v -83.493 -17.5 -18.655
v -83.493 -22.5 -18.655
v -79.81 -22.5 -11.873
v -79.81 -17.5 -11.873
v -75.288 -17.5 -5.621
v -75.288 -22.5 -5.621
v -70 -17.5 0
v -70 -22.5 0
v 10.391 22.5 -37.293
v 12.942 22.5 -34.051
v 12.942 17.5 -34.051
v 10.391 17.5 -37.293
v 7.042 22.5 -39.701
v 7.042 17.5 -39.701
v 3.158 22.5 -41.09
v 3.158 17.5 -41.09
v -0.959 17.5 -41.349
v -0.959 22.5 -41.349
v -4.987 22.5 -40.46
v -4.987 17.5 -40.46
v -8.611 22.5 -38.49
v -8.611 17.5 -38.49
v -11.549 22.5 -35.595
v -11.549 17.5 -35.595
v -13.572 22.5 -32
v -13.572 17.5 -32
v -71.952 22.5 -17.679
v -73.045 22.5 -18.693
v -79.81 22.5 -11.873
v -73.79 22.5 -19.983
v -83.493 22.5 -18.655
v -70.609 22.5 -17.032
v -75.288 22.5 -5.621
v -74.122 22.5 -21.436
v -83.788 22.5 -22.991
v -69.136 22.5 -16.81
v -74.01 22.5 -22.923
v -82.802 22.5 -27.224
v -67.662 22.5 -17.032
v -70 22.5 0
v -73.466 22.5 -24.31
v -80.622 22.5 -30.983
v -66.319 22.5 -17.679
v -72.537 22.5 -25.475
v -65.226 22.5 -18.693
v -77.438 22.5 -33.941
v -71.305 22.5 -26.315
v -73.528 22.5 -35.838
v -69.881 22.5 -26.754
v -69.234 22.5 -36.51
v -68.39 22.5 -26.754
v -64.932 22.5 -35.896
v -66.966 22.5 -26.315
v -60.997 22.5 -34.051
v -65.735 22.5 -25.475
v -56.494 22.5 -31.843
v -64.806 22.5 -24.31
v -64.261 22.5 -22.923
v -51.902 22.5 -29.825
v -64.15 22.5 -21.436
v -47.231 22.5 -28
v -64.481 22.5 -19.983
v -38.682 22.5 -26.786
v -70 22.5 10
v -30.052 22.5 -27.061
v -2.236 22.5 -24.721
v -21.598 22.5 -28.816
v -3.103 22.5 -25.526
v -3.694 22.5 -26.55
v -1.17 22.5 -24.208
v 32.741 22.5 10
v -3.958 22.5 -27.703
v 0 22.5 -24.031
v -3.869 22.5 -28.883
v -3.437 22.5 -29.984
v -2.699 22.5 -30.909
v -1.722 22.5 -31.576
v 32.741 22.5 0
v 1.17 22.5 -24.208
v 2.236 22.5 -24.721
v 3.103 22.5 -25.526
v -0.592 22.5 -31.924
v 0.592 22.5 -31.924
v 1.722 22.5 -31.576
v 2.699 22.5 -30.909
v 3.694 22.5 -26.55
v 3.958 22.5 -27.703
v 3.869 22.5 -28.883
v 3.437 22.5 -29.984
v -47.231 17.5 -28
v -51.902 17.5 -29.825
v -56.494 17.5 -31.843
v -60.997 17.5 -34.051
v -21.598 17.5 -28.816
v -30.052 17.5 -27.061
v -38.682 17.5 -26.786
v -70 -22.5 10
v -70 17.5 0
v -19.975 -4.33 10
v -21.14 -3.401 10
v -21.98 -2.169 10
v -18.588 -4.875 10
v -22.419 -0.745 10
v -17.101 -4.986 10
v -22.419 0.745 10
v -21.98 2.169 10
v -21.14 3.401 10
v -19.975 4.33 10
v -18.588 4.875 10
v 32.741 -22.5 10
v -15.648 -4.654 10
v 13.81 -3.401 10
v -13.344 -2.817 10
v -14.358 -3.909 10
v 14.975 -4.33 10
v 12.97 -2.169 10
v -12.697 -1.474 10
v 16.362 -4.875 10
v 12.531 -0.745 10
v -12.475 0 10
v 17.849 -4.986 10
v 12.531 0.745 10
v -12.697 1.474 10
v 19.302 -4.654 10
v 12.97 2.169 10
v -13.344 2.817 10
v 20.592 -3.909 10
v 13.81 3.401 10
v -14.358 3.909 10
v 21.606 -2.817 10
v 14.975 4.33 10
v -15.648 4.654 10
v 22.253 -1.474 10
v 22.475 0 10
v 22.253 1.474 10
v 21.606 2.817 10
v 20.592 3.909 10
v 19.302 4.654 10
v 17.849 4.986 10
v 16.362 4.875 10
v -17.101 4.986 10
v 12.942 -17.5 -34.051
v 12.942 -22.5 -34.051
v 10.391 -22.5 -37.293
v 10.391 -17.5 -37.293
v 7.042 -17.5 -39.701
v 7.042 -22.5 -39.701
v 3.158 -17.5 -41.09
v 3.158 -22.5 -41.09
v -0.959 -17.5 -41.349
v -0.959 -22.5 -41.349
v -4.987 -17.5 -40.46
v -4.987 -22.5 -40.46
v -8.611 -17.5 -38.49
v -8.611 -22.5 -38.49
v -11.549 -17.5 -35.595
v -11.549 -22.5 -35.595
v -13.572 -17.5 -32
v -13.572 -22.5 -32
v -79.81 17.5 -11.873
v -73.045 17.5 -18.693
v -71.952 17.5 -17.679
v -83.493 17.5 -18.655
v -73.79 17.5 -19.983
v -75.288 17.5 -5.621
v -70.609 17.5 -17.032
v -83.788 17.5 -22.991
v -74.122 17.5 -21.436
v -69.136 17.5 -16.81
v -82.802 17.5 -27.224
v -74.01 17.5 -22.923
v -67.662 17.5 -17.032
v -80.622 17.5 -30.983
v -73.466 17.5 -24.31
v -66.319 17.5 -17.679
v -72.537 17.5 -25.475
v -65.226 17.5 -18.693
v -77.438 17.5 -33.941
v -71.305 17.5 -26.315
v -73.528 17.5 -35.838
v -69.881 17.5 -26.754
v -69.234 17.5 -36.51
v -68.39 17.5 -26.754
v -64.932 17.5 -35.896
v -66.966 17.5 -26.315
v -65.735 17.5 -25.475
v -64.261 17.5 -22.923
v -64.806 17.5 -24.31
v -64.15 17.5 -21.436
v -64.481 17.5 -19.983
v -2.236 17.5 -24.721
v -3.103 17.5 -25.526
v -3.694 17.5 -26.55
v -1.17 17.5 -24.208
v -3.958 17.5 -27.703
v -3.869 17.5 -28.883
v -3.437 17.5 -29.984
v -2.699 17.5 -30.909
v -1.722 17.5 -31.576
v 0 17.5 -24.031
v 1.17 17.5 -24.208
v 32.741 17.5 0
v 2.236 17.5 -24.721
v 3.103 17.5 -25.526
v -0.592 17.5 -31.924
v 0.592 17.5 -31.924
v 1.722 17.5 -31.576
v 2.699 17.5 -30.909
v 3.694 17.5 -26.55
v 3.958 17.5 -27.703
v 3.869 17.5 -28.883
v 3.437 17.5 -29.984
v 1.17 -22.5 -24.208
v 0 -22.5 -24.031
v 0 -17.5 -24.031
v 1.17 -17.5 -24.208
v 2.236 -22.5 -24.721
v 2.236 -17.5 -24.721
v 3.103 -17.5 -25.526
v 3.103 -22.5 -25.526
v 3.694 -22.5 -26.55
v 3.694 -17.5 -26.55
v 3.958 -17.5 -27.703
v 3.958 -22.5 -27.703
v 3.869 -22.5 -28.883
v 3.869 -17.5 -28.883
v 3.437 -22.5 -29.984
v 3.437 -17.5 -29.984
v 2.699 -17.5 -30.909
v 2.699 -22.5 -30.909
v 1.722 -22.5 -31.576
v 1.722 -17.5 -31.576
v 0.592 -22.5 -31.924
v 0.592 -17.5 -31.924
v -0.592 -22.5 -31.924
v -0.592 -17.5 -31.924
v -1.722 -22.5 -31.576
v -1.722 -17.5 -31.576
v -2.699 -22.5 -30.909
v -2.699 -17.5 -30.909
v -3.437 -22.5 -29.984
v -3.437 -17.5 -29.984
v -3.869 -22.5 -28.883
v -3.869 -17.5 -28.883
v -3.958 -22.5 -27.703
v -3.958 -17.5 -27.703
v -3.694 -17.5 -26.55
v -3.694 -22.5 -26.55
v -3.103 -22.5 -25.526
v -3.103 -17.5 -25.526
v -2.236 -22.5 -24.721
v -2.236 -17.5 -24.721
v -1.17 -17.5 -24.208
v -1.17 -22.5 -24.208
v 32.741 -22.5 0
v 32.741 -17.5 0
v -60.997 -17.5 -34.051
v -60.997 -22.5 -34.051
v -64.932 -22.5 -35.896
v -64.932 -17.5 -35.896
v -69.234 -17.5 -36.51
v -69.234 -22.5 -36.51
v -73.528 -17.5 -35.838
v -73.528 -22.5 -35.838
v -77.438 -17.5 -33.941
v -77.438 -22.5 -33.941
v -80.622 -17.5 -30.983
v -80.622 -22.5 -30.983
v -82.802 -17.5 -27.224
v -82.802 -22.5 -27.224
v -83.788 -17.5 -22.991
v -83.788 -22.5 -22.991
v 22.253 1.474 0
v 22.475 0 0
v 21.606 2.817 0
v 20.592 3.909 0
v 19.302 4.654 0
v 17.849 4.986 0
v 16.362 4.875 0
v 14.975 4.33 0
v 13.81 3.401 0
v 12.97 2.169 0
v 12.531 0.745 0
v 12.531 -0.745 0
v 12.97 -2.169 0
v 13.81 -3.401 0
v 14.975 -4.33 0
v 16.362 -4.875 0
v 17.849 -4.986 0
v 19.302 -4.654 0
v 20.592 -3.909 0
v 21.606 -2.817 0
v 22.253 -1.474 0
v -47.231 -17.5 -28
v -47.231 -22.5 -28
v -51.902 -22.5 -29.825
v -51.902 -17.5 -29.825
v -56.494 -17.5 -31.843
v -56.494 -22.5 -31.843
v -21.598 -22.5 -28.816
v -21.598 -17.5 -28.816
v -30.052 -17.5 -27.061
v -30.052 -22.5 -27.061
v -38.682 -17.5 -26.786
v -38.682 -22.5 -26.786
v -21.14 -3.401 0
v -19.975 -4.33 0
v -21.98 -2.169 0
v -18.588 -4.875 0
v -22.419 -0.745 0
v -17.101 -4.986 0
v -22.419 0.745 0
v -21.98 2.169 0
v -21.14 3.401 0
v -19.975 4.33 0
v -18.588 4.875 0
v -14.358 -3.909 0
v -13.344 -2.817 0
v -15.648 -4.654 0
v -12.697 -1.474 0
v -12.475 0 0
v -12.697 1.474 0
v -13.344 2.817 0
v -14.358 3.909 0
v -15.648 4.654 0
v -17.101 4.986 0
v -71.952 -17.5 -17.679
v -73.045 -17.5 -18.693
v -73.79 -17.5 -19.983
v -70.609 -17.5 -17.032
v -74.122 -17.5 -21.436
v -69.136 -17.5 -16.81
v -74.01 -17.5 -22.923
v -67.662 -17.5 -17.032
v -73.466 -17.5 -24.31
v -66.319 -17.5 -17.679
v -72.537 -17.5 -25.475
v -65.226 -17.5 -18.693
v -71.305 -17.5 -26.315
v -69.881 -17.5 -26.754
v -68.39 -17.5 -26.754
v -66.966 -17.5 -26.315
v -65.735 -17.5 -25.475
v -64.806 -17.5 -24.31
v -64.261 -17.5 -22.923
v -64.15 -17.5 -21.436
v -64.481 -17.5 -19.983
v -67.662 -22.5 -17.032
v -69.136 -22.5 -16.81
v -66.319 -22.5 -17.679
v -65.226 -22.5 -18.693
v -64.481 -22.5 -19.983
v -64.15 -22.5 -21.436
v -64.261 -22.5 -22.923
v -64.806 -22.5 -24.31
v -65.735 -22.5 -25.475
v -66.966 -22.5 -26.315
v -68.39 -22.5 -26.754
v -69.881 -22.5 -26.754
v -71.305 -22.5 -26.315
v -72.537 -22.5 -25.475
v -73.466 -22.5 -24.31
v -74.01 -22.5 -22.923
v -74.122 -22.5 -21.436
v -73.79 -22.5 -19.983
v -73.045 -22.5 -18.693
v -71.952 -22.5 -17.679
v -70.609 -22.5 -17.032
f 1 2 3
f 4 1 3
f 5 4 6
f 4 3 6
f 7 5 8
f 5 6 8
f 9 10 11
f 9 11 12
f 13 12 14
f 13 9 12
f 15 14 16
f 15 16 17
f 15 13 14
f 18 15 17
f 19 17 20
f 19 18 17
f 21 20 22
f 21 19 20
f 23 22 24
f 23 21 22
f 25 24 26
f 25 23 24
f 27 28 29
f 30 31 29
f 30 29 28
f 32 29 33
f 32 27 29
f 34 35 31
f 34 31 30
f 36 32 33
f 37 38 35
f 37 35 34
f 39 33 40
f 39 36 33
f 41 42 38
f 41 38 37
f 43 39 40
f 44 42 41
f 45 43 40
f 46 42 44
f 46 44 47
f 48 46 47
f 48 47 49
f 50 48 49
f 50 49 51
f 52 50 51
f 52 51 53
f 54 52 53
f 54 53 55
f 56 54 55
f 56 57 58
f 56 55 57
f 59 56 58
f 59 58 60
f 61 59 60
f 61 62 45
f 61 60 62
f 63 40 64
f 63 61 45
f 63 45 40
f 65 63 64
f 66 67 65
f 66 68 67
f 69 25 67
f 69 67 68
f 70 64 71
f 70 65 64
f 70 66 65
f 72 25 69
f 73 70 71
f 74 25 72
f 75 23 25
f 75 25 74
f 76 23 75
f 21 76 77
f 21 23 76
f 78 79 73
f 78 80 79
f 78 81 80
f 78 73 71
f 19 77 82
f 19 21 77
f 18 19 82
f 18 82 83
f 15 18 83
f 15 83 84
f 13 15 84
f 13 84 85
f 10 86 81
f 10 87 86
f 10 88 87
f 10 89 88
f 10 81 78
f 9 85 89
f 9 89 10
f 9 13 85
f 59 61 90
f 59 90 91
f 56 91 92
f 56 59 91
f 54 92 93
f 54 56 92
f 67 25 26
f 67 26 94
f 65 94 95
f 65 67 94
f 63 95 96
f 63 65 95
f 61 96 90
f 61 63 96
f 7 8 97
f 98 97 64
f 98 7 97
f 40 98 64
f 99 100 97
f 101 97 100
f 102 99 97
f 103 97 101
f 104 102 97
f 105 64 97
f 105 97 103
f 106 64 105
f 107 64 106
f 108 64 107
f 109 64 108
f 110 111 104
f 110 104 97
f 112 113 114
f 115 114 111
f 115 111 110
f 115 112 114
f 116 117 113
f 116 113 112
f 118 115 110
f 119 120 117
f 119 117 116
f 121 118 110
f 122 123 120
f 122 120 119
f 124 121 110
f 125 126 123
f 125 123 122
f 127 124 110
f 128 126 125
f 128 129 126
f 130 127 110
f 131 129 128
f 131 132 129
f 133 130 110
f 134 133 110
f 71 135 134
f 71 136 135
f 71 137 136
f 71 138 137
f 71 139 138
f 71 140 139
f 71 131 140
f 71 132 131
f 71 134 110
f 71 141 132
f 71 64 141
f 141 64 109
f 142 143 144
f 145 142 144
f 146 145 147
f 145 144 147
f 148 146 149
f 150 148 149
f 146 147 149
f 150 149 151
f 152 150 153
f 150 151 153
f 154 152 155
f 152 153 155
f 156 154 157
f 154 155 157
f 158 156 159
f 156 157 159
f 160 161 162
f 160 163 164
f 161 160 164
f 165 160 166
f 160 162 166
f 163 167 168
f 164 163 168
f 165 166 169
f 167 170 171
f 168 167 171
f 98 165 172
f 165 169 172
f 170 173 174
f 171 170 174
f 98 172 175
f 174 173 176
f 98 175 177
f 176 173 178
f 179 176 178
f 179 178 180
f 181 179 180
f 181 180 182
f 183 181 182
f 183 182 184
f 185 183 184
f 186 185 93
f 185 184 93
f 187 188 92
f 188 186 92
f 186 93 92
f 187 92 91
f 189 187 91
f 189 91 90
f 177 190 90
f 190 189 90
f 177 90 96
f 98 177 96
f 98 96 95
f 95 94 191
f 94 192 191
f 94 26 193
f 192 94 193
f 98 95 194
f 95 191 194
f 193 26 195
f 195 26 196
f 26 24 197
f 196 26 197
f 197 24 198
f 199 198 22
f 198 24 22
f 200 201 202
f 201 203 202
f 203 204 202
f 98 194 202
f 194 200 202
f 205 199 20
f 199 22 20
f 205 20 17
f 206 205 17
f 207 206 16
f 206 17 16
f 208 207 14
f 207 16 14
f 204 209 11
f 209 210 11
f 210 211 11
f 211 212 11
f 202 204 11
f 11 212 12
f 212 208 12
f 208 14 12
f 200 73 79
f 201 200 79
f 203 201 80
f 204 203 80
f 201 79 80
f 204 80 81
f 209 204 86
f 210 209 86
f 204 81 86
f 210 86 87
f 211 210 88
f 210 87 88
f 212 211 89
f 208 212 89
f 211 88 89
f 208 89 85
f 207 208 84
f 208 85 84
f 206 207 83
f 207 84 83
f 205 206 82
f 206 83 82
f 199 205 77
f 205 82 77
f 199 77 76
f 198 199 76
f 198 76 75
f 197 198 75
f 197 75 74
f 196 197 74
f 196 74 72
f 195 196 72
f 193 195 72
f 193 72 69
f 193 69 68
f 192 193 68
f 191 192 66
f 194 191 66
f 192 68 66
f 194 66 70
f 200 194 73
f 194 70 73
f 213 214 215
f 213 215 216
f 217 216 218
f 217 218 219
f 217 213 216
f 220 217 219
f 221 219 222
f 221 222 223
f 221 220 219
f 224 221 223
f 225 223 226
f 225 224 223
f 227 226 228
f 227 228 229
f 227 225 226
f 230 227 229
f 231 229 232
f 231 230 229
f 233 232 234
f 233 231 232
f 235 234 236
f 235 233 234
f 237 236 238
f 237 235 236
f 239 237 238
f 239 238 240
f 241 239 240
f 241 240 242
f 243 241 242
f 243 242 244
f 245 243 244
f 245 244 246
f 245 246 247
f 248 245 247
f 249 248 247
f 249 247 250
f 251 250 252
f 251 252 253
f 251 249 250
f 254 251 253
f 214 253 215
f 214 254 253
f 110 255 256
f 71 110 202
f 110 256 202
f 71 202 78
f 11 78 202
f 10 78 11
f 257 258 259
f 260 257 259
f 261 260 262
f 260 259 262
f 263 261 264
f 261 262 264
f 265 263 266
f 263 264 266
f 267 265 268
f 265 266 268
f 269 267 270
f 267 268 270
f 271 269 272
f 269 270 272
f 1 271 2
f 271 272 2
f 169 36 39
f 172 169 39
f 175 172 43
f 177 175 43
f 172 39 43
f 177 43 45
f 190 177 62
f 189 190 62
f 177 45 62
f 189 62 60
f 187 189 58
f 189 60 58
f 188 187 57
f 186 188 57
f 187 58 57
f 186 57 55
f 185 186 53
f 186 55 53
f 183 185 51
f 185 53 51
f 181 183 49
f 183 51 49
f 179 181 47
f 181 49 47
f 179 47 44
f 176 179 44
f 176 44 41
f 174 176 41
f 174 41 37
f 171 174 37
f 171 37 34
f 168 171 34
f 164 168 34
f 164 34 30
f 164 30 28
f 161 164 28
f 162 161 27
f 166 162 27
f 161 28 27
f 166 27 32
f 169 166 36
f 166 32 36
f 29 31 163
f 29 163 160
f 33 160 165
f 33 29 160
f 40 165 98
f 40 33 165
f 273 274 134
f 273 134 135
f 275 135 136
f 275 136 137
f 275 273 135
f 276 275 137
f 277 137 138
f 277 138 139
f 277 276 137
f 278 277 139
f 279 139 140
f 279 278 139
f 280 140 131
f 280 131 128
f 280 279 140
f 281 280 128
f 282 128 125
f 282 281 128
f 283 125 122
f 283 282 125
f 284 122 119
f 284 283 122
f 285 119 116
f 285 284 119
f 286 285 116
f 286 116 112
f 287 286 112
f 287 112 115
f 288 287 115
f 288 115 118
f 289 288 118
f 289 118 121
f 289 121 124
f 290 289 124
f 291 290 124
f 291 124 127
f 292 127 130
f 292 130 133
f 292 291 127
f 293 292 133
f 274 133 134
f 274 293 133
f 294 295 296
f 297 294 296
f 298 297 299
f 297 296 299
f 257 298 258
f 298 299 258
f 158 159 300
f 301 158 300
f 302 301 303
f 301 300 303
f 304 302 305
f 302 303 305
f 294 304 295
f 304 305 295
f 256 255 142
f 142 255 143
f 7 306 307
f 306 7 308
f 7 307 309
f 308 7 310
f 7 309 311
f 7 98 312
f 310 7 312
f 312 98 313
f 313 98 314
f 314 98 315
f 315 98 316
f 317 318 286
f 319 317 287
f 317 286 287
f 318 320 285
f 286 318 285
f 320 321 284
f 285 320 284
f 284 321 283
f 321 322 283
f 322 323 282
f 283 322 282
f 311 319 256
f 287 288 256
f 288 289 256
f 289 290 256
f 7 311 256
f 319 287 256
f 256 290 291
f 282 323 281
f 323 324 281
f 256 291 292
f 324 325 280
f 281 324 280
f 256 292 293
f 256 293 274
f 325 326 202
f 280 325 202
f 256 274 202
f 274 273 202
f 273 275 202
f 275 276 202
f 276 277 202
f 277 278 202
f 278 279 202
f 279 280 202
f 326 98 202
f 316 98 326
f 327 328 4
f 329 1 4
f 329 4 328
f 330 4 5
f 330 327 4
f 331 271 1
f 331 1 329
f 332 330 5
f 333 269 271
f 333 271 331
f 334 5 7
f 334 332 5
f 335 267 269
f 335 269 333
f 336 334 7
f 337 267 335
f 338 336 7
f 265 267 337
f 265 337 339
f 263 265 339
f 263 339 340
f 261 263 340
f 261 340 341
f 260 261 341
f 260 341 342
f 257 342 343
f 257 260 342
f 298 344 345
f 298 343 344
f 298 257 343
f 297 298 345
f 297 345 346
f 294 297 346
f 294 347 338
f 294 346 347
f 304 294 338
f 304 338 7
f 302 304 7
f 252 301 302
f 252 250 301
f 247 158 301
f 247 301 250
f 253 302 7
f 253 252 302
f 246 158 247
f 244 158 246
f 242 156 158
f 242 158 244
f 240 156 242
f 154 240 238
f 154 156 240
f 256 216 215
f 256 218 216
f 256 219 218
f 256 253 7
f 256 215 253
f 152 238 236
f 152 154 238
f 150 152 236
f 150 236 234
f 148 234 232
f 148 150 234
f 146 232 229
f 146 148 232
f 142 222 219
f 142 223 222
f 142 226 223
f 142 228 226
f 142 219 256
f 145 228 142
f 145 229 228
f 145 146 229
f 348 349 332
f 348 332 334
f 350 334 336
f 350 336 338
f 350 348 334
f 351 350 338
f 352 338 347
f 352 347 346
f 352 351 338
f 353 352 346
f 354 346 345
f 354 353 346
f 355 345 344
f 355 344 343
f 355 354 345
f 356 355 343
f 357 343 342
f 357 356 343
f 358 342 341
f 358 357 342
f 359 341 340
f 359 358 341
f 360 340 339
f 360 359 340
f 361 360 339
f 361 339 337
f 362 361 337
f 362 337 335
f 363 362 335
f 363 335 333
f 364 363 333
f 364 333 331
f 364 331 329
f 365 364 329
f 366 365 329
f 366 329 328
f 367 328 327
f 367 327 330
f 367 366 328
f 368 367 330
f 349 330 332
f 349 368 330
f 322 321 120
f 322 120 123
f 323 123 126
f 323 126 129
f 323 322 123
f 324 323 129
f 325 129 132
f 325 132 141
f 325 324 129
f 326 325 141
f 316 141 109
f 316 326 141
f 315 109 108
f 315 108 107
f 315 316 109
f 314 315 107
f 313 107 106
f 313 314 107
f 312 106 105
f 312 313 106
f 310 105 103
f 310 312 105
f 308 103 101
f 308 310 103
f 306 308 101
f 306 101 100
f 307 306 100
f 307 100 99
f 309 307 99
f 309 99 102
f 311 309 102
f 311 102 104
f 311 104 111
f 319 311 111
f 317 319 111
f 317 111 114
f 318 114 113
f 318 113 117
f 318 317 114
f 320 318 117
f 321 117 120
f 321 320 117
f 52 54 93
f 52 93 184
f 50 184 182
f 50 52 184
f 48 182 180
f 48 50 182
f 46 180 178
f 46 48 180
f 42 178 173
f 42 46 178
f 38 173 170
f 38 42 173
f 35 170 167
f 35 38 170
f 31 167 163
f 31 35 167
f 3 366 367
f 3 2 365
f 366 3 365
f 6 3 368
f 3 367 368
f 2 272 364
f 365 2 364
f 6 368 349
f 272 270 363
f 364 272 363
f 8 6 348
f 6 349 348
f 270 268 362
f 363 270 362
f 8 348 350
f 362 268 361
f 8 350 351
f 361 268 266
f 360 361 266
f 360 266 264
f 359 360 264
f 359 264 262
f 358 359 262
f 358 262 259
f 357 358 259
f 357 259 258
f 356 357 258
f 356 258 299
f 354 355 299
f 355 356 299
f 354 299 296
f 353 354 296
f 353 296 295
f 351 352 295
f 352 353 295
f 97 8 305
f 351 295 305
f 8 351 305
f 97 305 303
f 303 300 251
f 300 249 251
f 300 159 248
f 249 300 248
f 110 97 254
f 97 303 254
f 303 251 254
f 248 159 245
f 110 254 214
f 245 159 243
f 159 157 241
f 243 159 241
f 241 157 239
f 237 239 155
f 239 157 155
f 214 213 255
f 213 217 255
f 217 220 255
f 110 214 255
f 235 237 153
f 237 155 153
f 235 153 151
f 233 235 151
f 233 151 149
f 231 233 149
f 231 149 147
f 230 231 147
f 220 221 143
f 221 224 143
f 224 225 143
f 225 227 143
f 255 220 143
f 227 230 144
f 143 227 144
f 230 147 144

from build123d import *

# Parameters (mm, degrees)
SKETCH2_W           = 102.74136237
SKETCH2_H           = 45
SKETCH2_R           = 5
BOSS_EXTRUDE1_DEPTH = 10
SKETCH3_R           = 5
SKETCH3_R_2         = 3.96875
BOSS_EXTRUDE2_DEPTH = 5


with BuildPart() as part:
    # Sketch2 → Boss-Extrude1 (new body)
    with BuildSketch(Plane.XY):
        with Locations((-18.629318815, 0)):
            Rectangle(SKETCH2_W, SKETCH2_H)
        with Locations((17.475, 0)):
            Circle(SKETCH2_R, mode=Mode.SUBTRACT)
        with Locations((-17.475, 0)):
            Circle(SKETCH2_R, mode=Mode.SUBTRACT)
    extrude(amount=BOSS_EXTRUDE1_DEPTH)

    # Sketch3 → Boss-Extrude2 (add)
    with BuildSketch(Plane(origin=(0, 22.5, 0), x_dir=(1, 0, 0), z_dir=(0, 1, 0))):
        with BuildLine():
            Line((32.74136237, -10), (32.74136237, 0))
            Line((32.74136237, 0), (12.941825805, 34.051297768))
            ThreePointArc((12.941825805, 34.051297768), (-0.958840285, 41.349241447), (-13.571539602, 32))
            ThreePointArc((-13.571539602, 32), (-30.051797166, 27.060729478), (-47.230652005, 28))
            ThreePointArc((-47.230652005, 28), (-54.208421011, 30.810382158), (-60.996938829, 34.051297768))
            ThreePointArc((-60.996938829, 34.051297768), (-77.438081848, 33.940854804), (-83.493041421, 18.654885879))
            ThreePointArc((-83.493041421, 18.654885879), (-77.649691032, 8.674181664), (-70, 0))
            Line((-70, 0), (-70, -10))
            Line((-70, -10), (32.74136237, -10))
        make_face()
        with Locations(Location((-69.135650368, 21.809953676, 0), (0, 0, 270))):
            Circle(SKETCH3_R, mode=Mode.SUBTRACT)
        with Locations(Location((0, 28, 0), (0, 0, 270))):
            Circle(SKETCH3_R_2, mode=Mode.SUBTRACT)
    boss_extrude2 = extrude(amount=-BOSS_EXTRUDE2_DEPTH)

    # Mirror1: Boss-Extrude2 across plane
    add(boss_extrude2.mirror(Plane.ZX))


solid = part.part
